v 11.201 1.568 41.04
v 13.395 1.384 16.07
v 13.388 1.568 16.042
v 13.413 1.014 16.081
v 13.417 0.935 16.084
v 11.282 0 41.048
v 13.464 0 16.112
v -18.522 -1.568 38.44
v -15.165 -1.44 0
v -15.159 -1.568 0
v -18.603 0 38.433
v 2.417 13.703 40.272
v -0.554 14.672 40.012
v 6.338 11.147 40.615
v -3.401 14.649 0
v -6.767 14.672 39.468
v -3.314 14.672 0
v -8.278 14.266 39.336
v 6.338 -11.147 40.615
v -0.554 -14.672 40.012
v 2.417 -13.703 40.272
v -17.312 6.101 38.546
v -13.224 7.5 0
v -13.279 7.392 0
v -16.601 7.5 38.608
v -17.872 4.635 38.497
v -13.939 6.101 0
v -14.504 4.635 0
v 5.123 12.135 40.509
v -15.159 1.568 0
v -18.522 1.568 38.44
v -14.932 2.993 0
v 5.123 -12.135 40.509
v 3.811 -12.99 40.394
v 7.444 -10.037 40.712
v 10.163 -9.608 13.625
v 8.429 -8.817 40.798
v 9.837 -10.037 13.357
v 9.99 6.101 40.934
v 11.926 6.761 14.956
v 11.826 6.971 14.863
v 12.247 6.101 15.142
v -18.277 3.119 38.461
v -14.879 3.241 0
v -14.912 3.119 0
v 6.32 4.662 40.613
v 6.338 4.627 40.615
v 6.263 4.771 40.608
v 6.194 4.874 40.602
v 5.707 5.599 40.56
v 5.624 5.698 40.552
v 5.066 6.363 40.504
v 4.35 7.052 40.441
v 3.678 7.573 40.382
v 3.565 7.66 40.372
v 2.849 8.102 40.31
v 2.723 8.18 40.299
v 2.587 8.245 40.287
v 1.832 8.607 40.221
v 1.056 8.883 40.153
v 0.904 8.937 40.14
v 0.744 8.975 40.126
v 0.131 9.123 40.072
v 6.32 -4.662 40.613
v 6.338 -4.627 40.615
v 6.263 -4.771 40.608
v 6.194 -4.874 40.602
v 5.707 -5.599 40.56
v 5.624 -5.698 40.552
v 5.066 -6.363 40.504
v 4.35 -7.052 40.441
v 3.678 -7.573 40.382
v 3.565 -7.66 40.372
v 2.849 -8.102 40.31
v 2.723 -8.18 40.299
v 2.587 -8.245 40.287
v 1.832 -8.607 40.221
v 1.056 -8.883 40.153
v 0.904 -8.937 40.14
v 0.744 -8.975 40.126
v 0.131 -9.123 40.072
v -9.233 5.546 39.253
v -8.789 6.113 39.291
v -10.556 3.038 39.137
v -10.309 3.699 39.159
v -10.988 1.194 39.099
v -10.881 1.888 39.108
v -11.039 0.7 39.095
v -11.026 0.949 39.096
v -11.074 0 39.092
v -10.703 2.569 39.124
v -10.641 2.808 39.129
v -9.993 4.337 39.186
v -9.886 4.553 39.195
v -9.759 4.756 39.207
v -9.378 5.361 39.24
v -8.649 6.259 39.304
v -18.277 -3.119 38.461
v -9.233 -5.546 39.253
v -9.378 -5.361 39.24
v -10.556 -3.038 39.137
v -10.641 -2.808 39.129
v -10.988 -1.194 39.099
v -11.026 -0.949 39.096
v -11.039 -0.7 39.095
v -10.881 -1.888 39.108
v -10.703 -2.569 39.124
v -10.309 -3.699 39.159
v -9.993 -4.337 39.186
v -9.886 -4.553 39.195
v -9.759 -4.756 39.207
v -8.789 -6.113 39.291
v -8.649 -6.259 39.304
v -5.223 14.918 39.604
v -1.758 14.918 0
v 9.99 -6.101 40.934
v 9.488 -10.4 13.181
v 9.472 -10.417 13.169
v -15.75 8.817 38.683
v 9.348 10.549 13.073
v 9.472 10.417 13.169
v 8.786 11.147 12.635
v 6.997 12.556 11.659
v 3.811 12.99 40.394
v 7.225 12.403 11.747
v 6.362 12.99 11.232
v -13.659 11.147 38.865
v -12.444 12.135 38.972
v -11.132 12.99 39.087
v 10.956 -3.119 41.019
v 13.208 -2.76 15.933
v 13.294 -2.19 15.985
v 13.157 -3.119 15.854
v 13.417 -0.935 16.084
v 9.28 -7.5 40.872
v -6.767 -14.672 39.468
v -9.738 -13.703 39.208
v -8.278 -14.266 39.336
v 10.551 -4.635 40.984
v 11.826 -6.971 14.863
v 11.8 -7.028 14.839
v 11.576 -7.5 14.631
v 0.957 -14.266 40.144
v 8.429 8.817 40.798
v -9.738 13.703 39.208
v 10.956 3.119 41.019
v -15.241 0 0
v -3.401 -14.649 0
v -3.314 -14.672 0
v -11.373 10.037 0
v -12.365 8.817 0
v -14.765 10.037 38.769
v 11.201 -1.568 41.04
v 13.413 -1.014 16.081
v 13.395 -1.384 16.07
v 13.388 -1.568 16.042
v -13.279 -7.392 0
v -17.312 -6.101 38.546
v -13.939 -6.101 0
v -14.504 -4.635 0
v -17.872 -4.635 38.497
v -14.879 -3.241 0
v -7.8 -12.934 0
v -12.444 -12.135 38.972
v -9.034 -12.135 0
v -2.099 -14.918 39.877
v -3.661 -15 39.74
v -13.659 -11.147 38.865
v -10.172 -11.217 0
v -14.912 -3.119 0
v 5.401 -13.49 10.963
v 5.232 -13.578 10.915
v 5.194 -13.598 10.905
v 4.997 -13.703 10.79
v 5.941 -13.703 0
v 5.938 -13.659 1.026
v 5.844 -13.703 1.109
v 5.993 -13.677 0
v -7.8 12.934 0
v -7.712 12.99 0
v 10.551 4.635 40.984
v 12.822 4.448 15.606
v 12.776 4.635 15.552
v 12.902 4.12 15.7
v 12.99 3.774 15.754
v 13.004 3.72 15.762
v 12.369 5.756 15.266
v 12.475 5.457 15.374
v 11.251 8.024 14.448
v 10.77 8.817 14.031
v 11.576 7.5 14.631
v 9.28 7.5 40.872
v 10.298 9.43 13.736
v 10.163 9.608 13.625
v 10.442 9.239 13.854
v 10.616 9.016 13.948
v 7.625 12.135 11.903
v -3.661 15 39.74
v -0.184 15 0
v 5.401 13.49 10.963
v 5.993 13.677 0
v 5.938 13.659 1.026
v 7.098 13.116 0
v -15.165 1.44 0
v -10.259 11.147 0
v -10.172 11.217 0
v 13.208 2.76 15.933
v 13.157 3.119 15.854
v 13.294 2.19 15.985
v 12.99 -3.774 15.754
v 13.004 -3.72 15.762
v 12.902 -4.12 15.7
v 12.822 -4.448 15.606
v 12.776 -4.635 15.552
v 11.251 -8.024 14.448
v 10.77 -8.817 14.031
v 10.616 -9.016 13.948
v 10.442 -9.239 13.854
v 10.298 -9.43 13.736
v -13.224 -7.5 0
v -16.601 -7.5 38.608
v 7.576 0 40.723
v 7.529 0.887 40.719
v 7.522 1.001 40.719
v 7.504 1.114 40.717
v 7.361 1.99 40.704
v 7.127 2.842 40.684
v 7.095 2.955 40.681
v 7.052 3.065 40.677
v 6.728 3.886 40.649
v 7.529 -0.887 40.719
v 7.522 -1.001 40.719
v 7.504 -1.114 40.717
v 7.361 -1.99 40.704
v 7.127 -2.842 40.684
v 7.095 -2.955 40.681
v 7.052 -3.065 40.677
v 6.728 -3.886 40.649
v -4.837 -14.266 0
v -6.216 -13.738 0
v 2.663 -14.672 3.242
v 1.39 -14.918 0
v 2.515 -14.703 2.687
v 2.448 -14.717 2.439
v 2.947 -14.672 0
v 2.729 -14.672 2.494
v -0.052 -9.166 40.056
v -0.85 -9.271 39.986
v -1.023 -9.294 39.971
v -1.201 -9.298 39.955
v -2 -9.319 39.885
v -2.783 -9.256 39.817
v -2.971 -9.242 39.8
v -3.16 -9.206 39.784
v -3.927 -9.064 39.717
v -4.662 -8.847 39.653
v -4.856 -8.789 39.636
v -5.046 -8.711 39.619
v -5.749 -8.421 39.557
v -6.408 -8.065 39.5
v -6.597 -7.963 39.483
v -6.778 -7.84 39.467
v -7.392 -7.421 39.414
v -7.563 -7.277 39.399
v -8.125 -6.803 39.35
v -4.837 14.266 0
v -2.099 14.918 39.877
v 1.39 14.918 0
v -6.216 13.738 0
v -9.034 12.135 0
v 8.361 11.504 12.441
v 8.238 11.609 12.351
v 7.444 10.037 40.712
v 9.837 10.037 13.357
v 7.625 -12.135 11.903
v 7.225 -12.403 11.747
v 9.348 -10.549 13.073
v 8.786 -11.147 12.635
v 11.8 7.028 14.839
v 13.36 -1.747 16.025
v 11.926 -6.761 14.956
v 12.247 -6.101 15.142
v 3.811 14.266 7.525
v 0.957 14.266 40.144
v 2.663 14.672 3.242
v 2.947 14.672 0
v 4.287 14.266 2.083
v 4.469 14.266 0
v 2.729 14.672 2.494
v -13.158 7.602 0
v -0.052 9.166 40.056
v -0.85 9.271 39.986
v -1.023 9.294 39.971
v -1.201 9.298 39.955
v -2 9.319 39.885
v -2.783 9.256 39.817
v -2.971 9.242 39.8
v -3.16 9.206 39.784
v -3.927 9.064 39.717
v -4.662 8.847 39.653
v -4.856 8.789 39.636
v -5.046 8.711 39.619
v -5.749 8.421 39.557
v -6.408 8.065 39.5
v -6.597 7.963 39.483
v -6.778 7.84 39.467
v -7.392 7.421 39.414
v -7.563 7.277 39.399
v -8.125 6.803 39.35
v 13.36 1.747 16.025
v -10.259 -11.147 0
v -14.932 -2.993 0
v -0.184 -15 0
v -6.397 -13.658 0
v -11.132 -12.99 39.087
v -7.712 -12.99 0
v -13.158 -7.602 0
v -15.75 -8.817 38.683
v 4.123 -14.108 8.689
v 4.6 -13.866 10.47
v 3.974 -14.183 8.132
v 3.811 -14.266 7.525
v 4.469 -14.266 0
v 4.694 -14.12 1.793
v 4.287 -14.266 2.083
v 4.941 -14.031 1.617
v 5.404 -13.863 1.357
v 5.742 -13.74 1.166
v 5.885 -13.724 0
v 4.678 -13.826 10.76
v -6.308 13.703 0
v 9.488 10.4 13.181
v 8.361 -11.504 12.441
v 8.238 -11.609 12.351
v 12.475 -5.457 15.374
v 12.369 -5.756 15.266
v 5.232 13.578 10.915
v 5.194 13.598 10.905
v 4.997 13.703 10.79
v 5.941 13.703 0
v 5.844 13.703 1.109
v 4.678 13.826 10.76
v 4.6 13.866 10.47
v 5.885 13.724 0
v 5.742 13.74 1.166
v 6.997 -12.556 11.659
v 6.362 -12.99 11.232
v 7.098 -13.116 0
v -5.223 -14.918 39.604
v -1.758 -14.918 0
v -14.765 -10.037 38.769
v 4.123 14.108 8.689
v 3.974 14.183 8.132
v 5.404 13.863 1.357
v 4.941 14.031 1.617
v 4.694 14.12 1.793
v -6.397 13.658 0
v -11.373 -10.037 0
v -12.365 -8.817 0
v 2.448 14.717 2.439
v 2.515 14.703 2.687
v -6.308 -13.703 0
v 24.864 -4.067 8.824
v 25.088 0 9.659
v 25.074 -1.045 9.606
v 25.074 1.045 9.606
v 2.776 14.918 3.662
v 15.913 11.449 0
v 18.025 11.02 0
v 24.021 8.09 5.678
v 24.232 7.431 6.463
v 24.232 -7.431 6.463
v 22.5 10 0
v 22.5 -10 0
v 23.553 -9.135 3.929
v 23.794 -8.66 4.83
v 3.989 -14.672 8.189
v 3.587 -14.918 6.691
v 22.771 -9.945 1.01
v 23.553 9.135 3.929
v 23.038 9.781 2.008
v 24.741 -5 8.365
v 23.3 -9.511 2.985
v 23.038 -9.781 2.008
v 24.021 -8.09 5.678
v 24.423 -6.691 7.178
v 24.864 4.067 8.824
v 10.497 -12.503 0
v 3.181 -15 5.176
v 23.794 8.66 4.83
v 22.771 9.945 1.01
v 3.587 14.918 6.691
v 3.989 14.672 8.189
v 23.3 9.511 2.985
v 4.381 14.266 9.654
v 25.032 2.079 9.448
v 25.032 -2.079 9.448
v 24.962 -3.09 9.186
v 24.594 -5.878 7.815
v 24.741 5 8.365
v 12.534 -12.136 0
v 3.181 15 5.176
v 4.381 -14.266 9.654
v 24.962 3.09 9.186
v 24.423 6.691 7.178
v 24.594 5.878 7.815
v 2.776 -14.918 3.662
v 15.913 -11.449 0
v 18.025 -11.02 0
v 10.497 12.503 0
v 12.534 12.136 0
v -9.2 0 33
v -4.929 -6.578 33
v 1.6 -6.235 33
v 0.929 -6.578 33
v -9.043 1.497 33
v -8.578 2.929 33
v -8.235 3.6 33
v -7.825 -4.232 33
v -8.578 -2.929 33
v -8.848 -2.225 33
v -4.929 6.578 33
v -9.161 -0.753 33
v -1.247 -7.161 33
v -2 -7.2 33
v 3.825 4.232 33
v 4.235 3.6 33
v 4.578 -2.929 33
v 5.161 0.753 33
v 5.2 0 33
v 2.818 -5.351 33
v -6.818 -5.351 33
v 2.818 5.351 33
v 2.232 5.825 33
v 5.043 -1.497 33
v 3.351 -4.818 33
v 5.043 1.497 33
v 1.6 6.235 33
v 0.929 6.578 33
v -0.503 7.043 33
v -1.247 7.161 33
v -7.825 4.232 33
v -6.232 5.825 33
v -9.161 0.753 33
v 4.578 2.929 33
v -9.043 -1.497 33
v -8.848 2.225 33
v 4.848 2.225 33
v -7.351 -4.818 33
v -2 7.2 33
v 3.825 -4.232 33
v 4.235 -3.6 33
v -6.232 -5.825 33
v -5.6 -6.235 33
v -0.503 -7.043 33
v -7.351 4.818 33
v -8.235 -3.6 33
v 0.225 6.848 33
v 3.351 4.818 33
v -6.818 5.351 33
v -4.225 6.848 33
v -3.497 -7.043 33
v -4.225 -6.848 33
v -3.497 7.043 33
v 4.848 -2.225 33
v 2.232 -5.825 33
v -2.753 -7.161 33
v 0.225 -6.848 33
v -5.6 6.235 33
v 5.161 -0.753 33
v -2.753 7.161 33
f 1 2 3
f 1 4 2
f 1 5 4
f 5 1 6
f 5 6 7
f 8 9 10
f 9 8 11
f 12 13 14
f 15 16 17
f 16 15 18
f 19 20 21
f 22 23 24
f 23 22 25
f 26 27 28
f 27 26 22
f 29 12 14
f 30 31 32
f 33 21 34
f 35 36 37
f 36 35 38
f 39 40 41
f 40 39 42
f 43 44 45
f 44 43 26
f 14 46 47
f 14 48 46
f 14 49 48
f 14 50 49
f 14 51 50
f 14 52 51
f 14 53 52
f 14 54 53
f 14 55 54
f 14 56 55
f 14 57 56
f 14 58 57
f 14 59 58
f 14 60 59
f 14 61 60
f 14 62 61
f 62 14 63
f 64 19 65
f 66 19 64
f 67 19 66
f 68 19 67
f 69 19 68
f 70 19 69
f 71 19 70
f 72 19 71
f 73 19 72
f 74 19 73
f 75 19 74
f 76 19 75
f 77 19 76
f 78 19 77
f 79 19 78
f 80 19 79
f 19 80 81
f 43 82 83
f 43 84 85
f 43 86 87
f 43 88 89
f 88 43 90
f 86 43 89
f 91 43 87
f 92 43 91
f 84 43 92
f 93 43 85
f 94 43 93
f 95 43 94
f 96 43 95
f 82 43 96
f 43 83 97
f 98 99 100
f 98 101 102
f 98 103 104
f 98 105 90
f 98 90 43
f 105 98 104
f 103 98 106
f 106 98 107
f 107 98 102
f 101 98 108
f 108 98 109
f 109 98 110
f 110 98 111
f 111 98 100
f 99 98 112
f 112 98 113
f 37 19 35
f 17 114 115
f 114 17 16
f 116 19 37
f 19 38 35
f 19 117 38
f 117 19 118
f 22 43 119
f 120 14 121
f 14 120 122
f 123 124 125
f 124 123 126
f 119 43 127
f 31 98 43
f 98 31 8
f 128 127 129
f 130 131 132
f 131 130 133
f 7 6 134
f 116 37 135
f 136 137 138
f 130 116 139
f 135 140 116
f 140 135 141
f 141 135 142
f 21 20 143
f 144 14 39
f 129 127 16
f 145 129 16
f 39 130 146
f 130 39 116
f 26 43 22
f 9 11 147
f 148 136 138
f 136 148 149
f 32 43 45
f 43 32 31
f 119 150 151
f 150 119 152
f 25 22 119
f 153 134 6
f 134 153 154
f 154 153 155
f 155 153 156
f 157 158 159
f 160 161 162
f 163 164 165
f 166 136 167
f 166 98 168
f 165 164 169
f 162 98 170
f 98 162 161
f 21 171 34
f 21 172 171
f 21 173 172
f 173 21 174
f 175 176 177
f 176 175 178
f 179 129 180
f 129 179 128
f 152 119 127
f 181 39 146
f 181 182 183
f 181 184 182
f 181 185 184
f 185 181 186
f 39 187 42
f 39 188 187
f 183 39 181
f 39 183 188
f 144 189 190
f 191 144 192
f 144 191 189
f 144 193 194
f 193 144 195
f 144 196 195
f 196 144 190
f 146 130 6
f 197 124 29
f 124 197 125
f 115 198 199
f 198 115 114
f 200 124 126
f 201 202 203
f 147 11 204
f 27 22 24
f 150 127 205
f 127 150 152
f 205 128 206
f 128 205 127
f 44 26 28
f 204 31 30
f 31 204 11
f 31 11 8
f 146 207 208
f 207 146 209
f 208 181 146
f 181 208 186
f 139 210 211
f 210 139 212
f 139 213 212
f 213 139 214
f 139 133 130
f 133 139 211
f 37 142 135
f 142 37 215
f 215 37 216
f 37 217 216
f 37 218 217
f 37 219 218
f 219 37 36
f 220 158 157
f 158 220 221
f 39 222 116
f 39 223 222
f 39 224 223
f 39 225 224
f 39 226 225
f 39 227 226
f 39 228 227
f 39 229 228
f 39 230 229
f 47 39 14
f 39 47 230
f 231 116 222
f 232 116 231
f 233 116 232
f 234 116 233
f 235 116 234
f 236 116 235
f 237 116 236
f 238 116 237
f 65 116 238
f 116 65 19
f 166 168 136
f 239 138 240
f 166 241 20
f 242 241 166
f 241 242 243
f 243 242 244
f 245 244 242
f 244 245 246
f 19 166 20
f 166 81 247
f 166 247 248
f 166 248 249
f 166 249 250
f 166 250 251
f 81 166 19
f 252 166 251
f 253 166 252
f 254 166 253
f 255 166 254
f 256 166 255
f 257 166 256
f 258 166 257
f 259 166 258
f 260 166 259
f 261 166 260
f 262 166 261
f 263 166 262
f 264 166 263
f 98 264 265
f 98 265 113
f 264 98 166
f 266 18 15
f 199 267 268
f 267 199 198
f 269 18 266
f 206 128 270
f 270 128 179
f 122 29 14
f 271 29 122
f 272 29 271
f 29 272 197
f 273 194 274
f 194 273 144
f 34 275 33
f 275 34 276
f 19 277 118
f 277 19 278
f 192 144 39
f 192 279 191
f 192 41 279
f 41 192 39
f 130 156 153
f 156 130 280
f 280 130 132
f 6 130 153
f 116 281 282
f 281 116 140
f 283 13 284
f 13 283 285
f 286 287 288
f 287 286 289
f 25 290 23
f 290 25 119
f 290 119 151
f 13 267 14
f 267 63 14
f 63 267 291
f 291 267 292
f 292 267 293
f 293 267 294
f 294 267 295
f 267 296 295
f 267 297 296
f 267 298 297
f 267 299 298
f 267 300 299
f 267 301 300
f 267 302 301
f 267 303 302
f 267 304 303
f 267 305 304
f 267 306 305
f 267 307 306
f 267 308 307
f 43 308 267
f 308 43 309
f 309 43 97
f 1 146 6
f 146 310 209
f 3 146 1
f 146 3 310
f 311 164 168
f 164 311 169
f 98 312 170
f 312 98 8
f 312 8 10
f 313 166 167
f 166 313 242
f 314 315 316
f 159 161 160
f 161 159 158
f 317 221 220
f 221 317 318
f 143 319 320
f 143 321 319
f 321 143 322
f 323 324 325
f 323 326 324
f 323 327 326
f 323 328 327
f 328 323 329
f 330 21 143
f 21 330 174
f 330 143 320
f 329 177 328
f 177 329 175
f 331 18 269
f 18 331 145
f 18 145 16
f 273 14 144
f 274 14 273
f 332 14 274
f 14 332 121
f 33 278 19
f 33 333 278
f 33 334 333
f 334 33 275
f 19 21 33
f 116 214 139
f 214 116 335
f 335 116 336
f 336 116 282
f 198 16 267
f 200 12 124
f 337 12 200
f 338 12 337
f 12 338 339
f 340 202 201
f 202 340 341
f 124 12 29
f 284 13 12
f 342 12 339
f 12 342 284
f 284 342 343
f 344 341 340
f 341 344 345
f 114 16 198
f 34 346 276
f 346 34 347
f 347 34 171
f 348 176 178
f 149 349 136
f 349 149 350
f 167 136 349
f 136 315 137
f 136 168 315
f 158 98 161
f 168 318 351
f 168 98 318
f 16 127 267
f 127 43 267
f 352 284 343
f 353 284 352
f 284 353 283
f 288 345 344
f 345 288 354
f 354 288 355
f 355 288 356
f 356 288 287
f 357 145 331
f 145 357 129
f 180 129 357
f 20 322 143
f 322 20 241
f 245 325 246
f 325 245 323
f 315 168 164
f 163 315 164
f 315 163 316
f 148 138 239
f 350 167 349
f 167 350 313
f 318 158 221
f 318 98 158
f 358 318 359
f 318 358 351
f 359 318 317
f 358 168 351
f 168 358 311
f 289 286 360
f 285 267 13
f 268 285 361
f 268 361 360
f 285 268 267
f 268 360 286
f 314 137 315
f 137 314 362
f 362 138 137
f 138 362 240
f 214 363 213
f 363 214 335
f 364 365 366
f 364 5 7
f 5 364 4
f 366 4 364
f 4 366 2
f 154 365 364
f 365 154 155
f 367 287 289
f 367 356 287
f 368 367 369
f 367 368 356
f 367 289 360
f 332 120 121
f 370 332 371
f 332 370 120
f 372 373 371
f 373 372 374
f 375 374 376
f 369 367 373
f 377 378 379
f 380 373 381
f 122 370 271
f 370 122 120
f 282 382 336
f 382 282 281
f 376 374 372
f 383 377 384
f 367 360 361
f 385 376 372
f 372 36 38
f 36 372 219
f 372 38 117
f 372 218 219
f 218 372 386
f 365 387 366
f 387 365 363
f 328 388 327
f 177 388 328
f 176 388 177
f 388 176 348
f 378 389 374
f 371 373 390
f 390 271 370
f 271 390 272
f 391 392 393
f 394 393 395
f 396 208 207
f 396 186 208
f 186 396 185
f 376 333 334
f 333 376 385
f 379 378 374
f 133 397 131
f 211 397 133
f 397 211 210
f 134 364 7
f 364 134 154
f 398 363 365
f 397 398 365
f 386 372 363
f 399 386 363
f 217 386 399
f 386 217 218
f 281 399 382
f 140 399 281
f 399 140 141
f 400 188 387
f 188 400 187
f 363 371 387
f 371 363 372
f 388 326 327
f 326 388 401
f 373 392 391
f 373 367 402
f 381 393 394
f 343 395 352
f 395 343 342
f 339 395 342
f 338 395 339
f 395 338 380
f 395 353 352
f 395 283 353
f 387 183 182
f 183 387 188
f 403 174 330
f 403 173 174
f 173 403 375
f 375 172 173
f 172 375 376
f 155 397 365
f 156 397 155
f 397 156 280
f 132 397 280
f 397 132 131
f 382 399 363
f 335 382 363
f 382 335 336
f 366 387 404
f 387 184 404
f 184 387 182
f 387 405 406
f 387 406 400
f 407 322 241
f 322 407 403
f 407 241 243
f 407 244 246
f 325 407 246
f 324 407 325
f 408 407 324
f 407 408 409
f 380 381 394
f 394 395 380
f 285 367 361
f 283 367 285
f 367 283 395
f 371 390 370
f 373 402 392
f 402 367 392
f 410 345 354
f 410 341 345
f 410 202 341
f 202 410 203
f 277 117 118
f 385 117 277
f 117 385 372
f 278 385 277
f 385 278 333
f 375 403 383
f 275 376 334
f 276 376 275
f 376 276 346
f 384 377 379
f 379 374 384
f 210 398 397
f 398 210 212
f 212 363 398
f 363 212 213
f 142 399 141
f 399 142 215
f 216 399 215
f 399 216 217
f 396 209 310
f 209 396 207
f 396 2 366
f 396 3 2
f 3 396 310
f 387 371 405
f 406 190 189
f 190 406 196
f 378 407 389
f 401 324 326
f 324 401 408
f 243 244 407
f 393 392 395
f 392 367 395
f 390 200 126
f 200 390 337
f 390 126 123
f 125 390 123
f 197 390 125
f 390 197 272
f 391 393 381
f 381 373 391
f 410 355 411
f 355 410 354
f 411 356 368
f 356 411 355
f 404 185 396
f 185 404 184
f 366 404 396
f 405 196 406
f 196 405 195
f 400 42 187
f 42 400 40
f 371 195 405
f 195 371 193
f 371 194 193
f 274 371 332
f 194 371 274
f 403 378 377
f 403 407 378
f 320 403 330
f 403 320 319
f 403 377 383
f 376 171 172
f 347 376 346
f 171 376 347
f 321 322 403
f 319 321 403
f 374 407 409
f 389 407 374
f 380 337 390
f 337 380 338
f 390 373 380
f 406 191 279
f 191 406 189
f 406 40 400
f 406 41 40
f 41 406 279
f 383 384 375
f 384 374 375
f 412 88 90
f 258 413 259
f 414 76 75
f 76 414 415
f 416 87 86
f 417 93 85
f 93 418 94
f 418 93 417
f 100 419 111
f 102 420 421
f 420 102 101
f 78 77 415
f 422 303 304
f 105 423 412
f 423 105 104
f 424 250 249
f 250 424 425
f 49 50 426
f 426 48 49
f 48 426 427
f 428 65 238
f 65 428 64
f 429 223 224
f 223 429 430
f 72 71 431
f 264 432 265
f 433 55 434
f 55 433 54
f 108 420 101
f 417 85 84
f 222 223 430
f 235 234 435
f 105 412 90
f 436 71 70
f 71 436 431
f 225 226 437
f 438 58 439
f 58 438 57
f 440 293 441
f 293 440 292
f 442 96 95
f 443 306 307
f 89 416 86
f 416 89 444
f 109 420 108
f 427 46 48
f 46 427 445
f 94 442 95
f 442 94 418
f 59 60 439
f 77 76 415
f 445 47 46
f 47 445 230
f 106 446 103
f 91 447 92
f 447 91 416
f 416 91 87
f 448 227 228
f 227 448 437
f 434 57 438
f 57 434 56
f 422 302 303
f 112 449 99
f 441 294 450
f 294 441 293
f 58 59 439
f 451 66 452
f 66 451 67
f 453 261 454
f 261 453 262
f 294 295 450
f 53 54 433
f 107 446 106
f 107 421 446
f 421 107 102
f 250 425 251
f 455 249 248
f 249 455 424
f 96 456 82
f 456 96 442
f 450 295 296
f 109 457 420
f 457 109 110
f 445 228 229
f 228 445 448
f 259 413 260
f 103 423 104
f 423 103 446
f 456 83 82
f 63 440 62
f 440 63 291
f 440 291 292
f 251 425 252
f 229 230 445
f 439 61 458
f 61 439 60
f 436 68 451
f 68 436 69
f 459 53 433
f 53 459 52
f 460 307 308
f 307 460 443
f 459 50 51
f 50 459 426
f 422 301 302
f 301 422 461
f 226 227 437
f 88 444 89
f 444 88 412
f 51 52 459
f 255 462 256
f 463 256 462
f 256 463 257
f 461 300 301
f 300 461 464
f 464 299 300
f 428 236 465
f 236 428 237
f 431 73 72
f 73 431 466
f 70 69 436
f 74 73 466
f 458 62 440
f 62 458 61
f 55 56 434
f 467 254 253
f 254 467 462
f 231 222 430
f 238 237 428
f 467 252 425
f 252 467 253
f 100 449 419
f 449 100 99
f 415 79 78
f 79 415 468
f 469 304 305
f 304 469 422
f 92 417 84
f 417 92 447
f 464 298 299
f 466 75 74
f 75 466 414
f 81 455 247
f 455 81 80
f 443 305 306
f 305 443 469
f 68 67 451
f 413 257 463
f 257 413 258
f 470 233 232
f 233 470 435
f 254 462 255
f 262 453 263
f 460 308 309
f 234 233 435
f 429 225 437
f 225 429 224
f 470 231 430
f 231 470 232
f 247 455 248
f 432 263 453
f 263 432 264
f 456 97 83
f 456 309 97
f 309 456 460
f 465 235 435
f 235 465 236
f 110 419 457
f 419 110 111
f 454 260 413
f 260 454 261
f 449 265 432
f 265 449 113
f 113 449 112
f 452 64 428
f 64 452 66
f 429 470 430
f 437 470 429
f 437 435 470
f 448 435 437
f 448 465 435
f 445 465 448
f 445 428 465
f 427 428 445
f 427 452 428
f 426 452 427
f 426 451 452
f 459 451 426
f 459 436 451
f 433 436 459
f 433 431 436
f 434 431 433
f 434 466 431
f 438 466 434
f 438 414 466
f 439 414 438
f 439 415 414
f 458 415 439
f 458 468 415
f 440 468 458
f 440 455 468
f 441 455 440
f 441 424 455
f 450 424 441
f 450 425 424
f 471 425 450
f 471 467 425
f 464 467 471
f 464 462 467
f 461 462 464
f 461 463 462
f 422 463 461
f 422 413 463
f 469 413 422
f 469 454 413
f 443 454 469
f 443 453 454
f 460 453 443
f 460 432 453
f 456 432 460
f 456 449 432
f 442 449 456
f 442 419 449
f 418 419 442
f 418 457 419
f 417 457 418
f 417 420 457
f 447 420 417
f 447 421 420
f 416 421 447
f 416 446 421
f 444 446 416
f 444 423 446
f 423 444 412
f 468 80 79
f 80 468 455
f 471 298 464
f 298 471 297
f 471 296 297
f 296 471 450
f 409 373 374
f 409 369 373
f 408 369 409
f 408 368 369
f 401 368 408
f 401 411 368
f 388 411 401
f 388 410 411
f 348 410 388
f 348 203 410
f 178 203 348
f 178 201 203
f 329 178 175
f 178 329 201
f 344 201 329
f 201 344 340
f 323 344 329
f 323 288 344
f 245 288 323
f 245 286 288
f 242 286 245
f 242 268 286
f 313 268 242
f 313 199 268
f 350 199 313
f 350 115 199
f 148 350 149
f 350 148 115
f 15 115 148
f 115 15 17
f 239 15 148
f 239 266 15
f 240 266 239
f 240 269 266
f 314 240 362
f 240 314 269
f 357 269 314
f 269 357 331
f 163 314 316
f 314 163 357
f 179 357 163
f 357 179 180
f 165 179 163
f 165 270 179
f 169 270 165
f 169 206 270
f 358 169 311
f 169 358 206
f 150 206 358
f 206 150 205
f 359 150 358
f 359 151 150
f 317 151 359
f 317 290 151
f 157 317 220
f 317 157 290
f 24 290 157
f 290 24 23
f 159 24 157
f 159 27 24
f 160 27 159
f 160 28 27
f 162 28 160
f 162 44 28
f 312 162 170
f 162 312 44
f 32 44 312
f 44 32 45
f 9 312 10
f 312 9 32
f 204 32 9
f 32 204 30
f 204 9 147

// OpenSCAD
$fn=60;

llama_leg_diameter = 18;
cast_diameter = 30;
llama_stump_height = 33;
cast_height = 42;

llama_stump_length = cast_height - llama_stump_height;

module legpart() {
    translate([0,0,-cast_height/20])
        rotate([0,-5,0])
            cylinder(cast_height,cast_diameter/2,cast_diameter/2);
}

module footpart() {
    translate([cast_diameter*0.75,0,0])
        rotate([0,-75,0])
            cylinder(cast_diameter/1.5,cast_diameter/3,cast_diameter/2);
}

module llama() {
    translate([0,0,cast_height])
        cylinder(125,25,25);
    translate([-2,0,cast_height+0.1])
        rotate([0,180,0])
            cylinder(h=llama_stump_length+0.1,r1=llama_leg_diameter/1.8,r2=llama_leg_diameter/2.5);
}

module pedestal() {
    rotate([0,180,0])
        cylinder(125,25,25);
}

module llama_cast() {
    difference() {
        union() {
            legpart();
            footpart();
        };
        llama();
        pedestal();
    }
}

llama_cast();
